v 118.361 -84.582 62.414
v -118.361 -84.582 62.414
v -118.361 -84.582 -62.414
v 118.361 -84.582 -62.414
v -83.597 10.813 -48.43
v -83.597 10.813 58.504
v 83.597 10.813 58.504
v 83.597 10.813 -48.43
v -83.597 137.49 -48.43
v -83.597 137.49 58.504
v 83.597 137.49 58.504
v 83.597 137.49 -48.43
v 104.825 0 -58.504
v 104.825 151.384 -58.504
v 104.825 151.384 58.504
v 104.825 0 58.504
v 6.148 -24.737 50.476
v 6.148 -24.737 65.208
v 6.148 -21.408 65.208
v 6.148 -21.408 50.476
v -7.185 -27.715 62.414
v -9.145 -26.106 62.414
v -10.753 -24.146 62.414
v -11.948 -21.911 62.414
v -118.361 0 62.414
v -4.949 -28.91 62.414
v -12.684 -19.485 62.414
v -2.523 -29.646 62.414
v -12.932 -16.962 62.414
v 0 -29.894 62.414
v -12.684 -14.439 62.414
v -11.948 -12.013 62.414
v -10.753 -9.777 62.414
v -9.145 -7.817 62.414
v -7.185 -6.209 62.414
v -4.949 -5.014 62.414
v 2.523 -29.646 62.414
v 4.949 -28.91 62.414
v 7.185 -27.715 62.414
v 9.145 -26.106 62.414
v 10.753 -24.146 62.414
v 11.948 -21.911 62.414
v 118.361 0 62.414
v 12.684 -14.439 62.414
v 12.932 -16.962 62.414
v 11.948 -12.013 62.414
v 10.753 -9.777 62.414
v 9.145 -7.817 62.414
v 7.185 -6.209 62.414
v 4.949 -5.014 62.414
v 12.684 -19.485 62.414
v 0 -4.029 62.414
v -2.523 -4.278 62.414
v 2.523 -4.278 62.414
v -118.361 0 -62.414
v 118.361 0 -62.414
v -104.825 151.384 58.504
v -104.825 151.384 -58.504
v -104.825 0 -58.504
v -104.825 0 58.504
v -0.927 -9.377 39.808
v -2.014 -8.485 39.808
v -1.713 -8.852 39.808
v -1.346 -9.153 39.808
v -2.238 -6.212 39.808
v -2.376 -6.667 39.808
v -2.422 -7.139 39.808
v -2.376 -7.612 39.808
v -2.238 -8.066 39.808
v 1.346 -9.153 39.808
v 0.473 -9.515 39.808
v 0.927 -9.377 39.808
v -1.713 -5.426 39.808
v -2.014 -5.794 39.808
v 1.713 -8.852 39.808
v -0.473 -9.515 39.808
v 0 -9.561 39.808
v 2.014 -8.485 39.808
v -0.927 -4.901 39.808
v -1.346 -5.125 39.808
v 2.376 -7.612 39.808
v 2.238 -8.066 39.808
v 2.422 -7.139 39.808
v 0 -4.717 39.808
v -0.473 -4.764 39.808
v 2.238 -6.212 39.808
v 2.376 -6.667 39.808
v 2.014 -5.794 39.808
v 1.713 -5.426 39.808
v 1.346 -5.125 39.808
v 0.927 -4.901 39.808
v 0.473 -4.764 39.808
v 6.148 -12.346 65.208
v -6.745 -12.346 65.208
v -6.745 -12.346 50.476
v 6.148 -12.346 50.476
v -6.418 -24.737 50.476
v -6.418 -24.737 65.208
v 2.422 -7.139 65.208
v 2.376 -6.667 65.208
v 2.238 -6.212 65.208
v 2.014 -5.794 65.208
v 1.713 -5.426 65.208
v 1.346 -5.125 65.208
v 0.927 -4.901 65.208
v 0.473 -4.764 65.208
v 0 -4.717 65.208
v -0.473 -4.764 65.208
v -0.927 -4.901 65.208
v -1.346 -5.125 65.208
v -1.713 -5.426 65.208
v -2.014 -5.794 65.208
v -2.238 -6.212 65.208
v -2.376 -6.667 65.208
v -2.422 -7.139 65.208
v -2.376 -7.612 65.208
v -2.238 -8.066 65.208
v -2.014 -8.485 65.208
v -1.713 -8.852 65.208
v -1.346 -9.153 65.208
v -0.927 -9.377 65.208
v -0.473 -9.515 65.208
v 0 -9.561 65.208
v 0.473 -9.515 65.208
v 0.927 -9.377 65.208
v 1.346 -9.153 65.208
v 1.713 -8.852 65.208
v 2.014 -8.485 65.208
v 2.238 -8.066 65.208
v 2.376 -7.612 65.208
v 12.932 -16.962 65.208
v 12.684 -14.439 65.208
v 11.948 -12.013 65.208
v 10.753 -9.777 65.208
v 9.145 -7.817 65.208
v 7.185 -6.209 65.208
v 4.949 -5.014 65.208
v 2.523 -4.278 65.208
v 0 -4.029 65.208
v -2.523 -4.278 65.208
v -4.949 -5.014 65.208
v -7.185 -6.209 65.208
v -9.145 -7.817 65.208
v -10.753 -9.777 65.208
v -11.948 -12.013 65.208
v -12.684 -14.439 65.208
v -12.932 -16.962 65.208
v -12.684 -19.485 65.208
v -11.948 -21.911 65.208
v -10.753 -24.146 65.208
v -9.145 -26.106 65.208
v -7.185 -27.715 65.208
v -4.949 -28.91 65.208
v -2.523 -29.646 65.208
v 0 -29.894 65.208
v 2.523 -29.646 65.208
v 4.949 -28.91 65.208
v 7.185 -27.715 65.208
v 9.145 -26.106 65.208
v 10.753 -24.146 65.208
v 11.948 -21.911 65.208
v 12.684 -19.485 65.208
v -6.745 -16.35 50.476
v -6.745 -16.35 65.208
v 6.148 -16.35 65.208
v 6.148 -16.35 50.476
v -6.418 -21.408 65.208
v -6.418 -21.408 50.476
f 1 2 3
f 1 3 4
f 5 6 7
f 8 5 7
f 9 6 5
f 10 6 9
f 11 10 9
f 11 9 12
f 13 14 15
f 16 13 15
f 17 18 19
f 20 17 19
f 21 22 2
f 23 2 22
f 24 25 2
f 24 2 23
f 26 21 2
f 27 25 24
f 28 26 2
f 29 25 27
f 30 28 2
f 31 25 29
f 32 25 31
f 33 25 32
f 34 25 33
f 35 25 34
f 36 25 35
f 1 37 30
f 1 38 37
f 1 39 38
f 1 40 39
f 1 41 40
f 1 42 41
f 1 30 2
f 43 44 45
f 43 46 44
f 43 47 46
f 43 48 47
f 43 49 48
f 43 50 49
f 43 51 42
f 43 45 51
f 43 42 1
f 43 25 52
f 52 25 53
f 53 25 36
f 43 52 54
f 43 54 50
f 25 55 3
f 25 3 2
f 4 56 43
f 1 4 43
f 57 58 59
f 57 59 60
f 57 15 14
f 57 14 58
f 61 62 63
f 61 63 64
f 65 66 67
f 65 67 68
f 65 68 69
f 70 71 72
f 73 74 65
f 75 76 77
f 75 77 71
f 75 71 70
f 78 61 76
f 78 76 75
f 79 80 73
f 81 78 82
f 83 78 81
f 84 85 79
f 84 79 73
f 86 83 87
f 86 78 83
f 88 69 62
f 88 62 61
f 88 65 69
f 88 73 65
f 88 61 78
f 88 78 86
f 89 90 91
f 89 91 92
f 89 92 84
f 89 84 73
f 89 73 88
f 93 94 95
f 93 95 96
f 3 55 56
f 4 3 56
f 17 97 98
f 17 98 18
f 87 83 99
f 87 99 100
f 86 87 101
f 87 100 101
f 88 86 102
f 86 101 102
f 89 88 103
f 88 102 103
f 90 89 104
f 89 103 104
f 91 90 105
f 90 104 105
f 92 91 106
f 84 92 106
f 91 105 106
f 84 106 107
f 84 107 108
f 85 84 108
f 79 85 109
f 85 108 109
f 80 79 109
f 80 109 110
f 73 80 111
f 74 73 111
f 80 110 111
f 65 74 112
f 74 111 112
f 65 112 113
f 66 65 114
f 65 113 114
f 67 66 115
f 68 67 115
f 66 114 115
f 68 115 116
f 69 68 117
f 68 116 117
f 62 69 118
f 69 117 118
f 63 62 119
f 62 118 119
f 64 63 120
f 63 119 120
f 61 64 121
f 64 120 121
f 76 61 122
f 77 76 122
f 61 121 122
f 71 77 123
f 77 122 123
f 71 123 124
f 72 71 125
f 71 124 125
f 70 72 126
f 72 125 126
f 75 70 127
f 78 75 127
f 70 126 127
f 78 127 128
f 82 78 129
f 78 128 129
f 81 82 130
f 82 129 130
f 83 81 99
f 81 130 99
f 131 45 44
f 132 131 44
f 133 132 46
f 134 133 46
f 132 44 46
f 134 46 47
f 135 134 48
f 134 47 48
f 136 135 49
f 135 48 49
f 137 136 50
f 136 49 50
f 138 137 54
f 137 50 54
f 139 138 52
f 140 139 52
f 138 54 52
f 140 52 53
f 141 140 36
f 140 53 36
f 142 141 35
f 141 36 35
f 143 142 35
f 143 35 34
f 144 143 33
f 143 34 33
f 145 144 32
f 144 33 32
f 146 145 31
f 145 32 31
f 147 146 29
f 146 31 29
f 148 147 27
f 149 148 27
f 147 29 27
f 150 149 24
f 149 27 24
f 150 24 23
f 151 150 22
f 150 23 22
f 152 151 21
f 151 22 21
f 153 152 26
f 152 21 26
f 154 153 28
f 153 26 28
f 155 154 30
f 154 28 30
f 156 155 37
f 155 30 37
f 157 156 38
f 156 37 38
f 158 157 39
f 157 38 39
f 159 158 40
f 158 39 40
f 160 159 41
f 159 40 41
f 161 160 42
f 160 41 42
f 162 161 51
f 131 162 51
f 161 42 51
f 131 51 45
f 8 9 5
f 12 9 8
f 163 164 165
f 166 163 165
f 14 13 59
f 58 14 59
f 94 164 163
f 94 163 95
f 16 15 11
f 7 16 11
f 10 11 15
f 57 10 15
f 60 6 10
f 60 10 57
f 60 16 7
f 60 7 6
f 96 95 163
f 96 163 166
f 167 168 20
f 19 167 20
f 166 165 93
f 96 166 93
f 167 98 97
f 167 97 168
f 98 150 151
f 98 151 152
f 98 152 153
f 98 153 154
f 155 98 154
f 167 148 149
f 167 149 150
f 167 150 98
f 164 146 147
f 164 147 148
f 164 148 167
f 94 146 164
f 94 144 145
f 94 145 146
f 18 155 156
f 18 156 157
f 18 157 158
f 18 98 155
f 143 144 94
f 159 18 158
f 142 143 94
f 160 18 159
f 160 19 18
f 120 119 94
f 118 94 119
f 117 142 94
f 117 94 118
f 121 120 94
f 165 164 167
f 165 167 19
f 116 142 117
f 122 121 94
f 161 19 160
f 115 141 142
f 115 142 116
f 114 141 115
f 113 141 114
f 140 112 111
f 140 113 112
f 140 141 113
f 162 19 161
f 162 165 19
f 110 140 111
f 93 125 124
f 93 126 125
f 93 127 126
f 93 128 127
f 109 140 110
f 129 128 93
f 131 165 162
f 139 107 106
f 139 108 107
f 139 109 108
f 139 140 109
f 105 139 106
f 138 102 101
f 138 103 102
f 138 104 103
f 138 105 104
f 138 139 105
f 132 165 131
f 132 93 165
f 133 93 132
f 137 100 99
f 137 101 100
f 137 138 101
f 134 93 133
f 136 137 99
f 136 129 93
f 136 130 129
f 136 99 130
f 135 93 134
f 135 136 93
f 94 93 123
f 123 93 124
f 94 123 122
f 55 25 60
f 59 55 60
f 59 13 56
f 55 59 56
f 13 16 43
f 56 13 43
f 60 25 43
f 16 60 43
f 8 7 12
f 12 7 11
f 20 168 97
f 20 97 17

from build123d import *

# Parameters (mm, degrees)
F0_W      = 236.721322
F0_H      = 124.82763
F1_DEPTH  = 84.582
F2_W      = 209.650278
F2_H      = 117.007106
F3_DEPTH  = 151.384
F4_W      = 167.194322
F4_H      = 126.676479
F5_DEPTH  = 106.934
F6_R      = 12.932429
F7_DEPTH  = 2.794
F8_W      = 12.893153
F8_H      = 4.004114
F8_W_2    = 12.566442
F8_H_2    = 3.328527
F9_DEPTH  = 14.732
F10_R     = 2.422057
F11_DEPTH = 25.4


with BuildPart() as f1:
    # F0 (on Front) → F1 (new body)
    with BuildSketch(Plane.XZ):
        Rectangle(F0_W, F0_H)
    extrude(amount=F1_DEPTH)

    # F2 (on face) → F3 (join)
    with BuildSketch(Plane(origin=(0, 0, 0), x_dir=(-1, 0, 0), z_dir=(0, 1, 0))):
        Rectangle(F2_W, F2_H)
    extrude(amount=F3_DEPTH)

    # F4 (on face) → F5 (cut)
    with BuildSketch(Plane.XY.offset(58.503553)):
        with Locations((0, 74.151702)):
            Rectangle(F4_W, F4_H)
    extrude(amount=-F5_DEPTH, mode=Mode.SUBTRACT)

    # F6 (on face) → F7 (join)
    with BuildSketch(Plane.XY.offset(62.413815)):
        with Locations((0, -16.961597)):
            Circle(F6_R)
    extrude(amount=F7_DEPTH)

    # F8 (on face) → F9 (cut)
    with BuildSketch(Plane.XY.offset(65.207815)):
        with Locations((-0.298541, -14.347668)):
            Rectangle(F8_W, F8_H)
        with Locations((-0.135185, -23.072623)):
            Rectangle(F8_W_2, F8_H_2)
    extrude(amount=-F9_DEPTH, mode=Mode.SUBTRACT)

    # F10 (on face) → F11 (cut)
    with BuildSketch(Plane.XY.offset(65.207815)):
        with Locations((0, -7.139143)):
            Circle(F10_R)
    extrude(amount=-F11_DEPTH, mode=Mode.SUBTRACT)


solid = f1.part
